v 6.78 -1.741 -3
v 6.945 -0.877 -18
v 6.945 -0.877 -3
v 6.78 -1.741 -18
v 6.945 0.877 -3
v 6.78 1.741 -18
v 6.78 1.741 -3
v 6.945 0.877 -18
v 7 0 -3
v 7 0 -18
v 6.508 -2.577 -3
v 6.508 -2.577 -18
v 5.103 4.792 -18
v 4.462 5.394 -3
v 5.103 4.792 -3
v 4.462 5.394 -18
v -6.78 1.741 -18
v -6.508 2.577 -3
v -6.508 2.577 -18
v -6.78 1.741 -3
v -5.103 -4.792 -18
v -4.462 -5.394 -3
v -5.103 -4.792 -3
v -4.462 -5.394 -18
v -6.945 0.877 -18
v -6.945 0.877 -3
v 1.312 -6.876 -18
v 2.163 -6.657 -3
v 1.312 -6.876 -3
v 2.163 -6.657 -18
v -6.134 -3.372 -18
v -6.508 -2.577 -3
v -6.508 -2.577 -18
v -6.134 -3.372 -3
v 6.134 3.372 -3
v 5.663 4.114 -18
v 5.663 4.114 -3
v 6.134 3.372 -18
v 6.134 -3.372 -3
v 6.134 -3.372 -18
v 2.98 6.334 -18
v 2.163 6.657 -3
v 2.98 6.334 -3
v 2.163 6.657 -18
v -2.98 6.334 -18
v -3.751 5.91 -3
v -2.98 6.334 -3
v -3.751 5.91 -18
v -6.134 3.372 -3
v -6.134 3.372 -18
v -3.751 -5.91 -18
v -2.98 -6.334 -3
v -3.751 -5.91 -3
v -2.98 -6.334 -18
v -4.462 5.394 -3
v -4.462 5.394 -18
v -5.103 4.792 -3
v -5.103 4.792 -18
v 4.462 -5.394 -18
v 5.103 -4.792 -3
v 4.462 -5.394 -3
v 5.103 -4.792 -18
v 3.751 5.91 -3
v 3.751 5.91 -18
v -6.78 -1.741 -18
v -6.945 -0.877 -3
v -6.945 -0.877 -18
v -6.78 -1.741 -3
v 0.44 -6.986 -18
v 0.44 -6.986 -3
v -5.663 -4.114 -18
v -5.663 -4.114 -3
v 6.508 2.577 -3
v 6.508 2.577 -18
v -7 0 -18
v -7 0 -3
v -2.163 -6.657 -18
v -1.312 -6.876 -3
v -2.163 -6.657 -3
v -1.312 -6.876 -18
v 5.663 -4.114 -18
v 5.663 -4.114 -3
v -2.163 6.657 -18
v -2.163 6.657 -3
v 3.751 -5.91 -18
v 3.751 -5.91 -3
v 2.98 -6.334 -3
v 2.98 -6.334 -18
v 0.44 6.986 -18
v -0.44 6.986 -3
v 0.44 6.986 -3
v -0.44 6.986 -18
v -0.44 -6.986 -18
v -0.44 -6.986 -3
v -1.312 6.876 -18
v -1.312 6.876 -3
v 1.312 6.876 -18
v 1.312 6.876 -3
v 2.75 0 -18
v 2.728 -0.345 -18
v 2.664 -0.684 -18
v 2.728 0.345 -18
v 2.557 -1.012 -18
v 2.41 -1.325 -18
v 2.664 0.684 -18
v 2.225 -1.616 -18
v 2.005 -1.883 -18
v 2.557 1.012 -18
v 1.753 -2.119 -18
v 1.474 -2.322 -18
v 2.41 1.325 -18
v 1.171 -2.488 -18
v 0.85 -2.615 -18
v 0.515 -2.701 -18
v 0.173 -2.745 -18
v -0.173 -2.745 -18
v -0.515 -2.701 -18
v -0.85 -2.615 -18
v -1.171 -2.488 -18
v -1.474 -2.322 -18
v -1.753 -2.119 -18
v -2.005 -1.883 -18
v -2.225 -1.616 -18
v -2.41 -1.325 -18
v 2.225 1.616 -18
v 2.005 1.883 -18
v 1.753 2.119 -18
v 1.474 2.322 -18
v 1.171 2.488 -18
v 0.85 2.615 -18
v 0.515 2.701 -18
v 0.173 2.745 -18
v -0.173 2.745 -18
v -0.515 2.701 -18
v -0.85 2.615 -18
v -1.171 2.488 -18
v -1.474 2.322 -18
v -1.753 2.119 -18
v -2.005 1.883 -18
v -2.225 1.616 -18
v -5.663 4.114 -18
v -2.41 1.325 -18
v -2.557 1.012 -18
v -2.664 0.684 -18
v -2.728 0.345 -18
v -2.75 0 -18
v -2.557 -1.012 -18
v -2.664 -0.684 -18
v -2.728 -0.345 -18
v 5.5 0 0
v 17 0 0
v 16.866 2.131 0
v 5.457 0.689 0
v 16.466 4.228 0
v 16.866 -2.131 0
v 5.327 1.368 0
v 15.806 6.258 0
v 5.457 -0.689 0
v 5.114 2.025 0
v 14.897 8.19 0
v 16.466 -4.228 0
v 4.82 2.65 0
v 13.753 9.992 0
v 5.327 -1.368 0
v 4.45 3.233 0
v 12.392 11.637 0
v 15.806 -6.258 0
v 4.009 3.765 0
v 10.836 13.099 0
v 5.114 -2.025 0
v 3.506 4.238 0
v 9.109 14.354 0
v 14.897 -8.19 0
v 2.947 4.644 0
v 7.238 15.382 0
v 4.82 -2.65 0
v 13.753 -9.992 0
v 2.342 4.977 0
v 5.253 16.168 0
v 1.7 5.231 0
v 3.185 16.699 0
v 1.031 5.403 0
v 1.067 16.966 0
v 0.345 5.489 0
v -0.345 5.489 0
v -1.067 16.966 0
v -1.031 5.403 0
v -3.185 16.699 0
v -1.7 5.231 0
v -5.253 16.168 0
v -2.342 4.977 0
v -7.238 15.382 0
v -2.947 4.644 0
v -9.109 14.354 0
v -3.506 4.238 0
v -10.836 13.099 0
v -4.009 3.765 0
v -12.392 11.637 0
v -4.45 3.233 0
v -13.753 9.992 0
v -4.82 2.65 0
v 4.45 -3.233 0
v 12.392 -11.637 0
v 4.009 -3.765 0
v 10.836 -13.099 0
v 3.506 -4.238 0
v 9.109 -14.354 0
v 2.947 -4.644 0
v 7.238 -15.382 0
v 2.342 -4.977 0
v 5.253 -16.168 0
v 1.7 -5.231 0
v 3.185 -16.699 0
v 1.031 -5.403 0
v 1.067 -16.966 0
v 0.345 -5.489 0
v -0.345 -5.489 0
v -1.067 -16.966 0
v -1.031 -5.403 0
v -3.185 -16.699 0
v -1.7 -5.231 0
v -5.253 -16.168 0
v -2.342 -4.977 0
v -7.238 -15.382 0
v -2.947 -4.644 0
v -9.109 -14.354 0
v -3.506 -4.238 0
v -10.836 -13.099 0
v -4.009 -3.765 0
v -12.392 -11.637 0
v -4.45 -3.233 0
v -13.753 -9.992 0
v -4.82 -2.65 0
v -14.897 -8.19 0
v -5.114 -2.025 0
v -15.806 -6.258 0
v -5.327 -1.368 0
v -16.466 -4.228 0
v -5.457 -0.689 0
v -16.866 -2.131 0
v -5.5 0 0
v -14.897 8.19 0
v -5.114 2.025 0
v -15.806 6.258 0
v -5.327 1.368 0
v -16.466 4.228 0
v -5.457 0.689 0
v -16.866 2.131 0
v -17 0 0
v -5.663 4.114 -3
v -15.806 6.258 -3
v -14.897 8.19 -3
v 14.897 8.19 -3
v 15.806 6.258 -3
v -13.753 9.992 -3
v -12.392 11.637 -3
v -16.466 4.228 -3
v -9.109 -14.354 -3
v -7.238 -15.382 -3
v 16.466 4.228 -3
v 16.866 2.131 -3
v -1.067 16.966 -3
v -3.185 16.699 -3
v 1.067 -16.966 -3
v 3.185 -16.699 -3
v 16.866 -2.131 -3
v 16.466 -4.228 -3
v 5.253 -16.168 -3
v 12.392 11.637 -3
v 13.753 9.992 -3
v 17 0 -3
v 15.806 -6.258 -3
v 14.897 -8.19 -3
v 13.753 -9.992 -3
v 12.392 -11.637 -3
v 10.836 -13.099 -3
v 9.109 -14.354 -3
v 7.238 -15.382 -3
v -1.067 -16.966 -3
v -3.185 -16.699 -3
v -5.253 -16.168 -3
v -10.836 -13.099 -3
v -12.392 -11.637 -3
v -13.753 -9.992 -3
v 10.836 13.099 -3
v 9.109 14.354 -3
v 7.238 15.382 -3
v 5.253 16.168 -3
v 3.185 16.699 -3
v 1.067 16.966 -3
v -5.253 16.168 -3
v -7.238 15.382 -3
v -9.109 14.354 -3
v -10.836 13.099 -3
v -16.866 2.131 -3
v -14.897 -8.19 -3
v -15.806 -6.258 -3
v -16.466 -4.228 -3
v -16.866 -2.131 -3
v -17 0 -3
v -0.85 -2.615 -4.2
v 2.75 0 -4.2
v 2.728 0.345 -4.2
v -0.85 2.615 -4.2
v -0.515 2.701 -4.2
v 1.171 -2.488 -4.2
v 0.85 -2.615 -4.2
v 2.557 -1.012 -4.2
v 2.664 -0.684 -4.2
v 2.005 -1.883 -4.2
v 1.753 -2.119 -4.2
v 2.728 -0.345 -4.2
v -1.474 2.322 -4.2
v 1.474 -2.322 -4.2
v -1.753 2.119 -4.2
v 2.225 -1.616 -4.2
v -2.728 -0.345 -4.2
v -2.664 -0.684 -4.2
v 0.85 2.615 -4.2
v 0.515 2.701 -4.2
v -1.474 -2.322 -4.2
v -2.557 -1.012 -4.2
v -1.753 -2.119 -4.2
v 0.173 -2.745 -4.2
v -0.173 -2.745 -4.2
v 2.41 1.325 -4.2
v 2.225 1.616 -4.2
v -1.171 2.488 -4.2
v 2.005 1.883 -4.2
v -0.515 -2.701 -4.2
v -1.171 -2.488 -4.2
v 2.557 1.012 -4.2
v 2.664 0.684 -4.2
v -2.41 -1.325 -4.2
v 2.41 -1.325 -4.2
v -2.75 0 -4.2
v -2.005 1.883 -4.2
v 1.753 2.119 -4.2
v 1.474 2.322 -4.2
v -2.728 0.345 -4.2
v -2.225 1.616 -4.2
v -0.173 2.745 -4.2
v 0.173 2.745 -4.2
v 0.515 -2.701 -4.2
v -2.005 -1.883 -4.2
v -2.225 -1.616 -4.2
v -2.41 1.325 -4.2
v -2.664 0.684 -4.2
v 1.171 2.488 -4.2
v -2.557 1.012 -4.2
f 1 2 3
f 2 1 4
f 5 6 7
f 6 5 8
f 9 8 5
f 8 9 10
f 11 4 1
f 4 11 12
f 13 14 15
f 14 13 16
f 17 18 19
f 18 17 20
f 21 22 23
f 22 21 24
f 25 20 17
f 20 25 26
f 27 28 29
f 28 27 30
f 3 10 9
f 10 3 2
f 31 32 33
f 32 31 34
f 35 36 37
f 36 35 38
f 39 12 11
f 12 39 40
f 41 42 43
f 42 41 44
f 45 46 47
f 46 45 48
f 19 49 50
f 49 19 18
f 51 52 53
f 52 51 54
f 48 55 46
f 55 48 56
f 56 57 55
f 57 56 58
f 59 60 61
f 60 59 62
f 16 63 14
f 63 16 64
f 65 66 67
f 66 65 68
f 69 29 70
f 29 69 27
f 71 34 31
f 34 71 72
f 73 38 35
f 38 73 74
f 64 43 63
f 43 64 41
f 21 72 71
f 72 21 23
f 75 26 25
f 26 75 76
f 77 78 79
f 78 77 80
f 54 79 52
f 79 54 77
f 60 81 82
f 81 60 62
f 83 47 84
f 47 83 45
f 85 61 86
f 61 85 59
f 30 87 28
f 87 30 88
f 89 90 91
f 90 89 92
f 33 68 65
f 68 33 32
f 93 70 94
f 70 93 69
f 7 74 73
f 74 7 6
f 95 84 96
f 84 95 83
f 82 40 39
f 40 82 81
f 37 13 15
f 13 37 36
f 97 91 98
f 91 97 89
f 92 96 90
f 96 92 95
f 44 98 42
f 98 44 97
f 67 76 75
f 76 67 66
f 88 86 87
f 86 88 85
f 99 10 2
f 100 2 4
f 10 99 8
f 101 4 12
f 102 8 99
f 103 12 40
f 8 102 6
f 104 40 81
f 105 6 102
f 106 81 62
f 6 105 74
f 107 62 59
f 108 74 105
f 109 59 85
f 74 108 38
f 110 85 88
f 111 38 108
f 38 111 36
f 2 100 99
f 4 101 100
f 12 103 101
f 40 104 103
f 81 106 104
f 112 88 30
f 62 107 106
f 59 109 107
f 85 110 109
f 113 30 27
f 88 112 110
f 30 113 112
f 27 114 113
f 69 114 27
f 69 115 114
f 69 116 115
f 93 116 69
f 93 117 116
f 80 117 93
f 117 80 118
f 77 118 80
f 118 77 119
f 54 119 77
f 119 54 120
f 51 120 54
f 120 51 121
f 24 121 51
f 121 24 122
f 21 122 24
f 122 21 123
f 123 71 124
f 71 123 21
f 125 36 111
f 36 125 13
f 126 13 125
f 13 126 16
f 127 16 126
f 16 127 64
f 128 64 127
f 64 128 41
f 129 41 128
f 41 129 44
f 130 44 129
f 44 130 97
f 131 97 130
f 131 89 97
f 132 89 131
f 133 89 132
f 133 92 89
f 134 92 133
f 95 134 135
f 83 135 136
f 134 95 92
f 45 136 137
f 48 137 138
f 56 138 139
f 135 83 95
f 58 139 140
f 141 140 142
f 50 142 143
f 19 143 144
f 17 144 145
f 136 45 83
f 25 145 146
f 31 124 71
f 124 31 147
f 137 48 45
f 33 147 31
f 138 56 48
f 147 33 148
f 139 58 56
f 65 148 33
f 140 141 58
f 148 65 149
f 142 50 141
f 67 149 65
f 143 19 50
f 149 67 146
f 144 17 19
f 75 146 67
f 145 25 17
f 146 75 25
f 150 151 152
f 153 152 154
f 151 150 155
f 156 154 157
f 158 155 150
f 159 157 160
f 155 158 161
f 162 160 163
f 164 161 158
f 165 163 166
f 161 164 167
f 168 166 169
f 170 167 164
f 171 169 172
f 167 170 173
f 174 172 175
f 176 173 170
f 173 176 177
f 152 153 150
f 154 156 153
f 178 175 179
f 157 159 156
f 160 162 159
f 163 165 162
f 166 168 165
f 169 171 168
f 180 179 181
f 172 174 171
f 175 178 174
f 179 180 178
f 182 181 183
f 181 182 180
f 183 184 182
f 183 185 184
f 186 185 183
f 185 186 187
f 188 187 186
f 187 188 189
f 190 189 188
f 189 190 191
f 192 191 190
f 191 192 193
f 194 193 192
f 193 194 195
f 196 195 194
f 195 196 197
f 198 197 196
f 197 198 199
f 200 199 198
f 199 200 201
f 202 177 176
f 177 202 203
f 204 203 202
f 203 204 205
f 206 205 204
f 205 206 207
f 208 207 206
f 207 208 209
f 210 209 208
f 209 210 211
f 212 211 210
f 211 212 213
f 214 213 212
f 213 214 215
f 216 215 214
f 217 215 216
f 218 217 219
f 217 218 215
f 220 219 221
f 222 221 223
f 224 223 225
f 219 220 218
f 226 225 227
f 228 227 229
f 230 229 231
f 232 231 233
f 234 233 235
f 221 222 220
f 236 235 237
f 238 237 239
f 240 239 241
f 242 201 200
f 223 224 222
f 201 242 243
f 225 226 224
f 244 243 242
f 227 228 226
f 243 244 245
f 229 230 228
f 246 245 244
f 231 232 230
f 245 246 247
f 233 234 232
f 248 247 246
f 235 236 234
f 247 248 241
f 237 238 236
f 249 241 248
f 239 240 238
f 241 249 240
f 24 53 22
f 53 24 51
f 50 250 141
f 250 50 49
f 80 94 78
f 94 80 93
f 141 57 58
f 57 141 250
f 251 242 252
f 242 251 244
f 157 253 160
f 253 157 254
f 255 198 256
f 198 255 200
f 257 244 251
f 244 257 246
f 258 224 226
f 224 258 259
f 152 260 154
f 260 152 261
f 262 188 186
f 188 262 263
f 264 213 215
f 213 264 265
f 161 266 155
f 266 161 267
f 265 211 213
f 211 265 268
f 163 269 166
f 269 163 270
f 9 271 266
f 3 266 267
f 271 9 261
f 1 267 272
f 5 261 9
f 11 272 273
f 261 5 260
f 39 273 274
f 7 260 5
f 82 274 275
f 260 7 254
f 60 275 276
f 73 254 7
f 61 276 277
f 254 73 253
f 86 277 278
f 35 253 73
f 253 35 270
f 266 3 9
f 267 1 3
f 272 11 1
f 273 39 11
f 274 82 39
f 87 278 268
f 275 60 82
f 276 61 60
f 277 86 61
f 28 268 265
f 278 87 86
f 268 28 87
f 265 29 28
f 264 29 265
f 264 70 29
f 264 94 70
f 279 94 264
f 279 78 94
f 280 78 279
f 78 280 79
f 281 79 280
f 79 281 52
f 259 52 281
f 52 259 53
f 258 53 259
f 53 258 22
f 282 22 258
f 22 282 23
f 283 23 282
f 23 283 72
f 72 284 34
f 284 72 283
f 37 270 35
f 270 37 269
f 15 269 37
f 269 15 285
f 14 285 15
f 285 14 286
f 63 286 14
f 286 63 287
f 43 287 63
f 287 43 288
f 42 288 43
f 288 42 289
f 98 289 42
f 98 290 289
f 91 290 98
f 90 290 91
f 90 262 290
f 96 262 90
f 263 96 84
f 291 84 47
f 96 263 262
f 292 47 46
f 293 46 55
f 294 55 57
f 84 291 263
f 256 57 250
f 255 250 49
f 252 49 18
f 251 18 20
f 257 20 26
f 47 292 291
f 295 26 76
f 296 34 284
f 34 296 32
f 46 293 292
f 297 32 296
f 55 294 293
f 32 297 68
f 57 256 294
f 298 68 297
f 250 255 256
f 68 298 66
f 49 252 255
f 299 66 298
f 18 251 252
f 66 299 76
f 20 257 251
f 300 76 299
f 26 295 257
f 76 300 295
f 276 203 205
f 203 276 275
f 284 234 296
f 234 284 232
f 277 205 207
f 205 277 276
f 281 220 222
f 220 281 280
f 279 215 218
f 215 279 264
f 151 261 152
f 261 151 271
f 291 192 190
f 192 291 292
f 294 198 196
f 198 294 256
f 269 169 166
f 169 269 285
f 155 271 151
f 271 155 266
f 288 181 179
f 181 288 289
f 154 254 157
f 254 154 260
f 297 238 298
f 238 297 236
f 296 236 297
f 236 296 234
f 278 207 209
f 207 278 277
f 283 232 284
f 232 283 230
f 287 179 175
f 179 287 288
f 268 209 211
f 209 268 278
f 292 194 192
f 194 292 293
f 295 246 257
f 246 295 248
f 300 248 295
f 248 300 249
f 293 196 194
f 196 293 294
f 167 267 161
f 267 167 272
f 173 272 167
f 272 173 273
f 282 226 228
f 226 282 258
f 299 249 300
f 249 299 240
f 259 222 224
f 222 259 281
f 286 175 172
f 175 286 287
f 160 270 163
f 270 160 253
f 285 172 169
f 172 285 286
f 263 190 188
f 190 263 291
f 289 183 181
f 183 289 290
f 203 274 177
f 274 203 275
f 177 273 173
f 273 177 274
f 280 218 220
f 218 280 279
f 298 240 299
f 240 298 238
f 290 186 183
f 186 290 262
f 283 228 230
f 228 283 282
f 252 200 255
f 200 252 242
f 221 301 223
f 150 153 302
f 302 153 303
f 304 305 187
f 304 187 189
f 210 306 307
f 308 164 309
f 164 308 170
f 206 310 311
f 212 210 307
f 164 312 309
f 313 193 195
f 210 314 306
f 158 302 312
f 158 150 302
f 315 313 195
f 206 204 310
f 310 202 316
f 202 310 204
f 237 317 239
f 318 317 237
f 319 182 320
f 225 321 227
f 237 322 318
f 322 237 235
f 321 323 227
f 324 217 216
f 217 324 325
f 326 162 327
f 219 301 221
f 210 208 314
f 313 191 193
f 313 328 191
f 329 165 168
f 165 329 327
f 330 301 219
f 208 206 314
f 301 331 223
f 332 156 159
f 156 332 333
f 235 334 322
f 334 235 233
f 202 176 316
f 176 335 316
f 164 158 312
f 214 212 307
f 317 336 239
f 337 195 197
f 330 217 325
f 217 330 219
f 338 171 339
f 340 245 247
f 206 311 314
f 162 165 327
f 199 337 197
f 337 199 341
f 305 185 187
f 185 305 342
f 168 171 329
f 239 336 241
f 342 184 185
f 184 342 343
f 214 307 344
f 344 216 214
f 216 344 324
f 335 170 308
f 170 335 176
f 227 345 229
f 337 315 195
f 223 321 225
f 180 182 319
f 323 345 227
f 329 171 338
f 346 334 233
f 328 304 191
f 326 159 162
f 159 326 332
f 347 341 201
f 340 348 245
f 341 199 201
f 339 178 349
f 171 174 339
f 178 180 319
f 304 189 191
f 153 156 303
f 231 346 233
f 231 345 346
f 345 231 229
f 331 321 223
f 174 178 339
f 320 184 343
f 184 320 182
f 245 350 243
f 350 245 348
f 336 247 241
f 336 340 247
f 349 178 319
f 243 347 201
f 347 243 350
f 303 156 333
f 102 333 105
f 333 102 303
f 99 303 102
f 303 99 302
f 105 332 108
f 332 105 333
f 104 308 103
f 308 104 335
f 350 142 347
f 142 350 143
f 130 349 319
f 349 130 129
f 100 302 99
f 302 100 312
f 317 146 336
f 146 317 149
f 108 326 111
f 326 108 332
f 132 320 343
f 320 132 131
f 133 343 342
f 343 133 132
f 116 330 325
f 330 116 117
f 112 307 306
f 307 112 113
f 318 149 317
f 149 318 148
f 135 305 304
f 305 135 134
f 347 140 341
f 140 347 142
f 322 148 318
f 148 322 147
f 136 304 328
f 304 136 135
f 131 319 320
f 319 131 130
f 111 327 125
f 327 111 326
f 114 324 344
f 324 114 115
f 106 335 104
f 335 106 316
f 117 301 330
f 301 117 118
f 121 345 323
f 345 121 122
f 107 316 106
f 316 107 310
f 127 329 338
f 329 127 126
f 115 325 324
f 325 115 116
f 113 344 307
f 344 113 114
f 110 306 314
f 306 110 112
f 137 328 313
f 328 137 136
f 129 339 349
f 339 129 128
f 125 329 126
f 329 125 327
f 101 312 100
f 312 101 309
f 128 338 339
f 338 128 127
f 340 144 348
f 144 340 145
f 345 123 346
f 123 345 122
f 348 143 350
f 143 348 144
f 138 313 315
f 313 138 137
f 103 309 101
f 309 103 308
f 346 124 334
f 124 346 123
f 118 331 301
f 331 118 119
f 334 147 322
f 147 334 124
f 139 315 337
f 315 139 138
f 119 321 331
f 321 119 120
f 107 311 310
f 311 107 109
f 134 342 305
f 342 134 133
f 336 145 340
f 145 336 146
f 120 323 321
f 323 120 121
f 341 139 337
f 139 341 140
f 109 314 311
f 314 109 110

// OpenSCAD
$fn = 50;


difference() {
	union() {
		translate(v = [0, 0, -18.0000000000]) {
			cylinder(h = 18, r = 7.0000000000);
		}
		translate(v = [0, 0, -3.0000000000]) {
			cylinder(h = 3, r = 17.0000000000);
		}
	}
	union() {
		translate(v = [0, 0, 0]) {
			rotate(a = [0, 0, 0]) {
				difference() {
					union() {
						#translate(v = [0, 0, -18.0000000000]) {
							cylinder(h = 18, r = 2.2500000000);
						}
						#translate(v = [0, 0, -4.2000000000]) {
							cylinder(h = 4.2000000000, r = 7.0000000000, r1 = 2.7500000000, r2 = 5.5000000000);
						}
						#translate(v = [0, 0, -18.0000000000]) {
							cylinder(h = 18, r = 2.7500000000);
						}
						#translate(v = [0, 0, -18.0000000000]) {
							cylinder(h = 18, r = 2.2500000000);
						}
					}
					union();
				}
			}
		}
	}
}
